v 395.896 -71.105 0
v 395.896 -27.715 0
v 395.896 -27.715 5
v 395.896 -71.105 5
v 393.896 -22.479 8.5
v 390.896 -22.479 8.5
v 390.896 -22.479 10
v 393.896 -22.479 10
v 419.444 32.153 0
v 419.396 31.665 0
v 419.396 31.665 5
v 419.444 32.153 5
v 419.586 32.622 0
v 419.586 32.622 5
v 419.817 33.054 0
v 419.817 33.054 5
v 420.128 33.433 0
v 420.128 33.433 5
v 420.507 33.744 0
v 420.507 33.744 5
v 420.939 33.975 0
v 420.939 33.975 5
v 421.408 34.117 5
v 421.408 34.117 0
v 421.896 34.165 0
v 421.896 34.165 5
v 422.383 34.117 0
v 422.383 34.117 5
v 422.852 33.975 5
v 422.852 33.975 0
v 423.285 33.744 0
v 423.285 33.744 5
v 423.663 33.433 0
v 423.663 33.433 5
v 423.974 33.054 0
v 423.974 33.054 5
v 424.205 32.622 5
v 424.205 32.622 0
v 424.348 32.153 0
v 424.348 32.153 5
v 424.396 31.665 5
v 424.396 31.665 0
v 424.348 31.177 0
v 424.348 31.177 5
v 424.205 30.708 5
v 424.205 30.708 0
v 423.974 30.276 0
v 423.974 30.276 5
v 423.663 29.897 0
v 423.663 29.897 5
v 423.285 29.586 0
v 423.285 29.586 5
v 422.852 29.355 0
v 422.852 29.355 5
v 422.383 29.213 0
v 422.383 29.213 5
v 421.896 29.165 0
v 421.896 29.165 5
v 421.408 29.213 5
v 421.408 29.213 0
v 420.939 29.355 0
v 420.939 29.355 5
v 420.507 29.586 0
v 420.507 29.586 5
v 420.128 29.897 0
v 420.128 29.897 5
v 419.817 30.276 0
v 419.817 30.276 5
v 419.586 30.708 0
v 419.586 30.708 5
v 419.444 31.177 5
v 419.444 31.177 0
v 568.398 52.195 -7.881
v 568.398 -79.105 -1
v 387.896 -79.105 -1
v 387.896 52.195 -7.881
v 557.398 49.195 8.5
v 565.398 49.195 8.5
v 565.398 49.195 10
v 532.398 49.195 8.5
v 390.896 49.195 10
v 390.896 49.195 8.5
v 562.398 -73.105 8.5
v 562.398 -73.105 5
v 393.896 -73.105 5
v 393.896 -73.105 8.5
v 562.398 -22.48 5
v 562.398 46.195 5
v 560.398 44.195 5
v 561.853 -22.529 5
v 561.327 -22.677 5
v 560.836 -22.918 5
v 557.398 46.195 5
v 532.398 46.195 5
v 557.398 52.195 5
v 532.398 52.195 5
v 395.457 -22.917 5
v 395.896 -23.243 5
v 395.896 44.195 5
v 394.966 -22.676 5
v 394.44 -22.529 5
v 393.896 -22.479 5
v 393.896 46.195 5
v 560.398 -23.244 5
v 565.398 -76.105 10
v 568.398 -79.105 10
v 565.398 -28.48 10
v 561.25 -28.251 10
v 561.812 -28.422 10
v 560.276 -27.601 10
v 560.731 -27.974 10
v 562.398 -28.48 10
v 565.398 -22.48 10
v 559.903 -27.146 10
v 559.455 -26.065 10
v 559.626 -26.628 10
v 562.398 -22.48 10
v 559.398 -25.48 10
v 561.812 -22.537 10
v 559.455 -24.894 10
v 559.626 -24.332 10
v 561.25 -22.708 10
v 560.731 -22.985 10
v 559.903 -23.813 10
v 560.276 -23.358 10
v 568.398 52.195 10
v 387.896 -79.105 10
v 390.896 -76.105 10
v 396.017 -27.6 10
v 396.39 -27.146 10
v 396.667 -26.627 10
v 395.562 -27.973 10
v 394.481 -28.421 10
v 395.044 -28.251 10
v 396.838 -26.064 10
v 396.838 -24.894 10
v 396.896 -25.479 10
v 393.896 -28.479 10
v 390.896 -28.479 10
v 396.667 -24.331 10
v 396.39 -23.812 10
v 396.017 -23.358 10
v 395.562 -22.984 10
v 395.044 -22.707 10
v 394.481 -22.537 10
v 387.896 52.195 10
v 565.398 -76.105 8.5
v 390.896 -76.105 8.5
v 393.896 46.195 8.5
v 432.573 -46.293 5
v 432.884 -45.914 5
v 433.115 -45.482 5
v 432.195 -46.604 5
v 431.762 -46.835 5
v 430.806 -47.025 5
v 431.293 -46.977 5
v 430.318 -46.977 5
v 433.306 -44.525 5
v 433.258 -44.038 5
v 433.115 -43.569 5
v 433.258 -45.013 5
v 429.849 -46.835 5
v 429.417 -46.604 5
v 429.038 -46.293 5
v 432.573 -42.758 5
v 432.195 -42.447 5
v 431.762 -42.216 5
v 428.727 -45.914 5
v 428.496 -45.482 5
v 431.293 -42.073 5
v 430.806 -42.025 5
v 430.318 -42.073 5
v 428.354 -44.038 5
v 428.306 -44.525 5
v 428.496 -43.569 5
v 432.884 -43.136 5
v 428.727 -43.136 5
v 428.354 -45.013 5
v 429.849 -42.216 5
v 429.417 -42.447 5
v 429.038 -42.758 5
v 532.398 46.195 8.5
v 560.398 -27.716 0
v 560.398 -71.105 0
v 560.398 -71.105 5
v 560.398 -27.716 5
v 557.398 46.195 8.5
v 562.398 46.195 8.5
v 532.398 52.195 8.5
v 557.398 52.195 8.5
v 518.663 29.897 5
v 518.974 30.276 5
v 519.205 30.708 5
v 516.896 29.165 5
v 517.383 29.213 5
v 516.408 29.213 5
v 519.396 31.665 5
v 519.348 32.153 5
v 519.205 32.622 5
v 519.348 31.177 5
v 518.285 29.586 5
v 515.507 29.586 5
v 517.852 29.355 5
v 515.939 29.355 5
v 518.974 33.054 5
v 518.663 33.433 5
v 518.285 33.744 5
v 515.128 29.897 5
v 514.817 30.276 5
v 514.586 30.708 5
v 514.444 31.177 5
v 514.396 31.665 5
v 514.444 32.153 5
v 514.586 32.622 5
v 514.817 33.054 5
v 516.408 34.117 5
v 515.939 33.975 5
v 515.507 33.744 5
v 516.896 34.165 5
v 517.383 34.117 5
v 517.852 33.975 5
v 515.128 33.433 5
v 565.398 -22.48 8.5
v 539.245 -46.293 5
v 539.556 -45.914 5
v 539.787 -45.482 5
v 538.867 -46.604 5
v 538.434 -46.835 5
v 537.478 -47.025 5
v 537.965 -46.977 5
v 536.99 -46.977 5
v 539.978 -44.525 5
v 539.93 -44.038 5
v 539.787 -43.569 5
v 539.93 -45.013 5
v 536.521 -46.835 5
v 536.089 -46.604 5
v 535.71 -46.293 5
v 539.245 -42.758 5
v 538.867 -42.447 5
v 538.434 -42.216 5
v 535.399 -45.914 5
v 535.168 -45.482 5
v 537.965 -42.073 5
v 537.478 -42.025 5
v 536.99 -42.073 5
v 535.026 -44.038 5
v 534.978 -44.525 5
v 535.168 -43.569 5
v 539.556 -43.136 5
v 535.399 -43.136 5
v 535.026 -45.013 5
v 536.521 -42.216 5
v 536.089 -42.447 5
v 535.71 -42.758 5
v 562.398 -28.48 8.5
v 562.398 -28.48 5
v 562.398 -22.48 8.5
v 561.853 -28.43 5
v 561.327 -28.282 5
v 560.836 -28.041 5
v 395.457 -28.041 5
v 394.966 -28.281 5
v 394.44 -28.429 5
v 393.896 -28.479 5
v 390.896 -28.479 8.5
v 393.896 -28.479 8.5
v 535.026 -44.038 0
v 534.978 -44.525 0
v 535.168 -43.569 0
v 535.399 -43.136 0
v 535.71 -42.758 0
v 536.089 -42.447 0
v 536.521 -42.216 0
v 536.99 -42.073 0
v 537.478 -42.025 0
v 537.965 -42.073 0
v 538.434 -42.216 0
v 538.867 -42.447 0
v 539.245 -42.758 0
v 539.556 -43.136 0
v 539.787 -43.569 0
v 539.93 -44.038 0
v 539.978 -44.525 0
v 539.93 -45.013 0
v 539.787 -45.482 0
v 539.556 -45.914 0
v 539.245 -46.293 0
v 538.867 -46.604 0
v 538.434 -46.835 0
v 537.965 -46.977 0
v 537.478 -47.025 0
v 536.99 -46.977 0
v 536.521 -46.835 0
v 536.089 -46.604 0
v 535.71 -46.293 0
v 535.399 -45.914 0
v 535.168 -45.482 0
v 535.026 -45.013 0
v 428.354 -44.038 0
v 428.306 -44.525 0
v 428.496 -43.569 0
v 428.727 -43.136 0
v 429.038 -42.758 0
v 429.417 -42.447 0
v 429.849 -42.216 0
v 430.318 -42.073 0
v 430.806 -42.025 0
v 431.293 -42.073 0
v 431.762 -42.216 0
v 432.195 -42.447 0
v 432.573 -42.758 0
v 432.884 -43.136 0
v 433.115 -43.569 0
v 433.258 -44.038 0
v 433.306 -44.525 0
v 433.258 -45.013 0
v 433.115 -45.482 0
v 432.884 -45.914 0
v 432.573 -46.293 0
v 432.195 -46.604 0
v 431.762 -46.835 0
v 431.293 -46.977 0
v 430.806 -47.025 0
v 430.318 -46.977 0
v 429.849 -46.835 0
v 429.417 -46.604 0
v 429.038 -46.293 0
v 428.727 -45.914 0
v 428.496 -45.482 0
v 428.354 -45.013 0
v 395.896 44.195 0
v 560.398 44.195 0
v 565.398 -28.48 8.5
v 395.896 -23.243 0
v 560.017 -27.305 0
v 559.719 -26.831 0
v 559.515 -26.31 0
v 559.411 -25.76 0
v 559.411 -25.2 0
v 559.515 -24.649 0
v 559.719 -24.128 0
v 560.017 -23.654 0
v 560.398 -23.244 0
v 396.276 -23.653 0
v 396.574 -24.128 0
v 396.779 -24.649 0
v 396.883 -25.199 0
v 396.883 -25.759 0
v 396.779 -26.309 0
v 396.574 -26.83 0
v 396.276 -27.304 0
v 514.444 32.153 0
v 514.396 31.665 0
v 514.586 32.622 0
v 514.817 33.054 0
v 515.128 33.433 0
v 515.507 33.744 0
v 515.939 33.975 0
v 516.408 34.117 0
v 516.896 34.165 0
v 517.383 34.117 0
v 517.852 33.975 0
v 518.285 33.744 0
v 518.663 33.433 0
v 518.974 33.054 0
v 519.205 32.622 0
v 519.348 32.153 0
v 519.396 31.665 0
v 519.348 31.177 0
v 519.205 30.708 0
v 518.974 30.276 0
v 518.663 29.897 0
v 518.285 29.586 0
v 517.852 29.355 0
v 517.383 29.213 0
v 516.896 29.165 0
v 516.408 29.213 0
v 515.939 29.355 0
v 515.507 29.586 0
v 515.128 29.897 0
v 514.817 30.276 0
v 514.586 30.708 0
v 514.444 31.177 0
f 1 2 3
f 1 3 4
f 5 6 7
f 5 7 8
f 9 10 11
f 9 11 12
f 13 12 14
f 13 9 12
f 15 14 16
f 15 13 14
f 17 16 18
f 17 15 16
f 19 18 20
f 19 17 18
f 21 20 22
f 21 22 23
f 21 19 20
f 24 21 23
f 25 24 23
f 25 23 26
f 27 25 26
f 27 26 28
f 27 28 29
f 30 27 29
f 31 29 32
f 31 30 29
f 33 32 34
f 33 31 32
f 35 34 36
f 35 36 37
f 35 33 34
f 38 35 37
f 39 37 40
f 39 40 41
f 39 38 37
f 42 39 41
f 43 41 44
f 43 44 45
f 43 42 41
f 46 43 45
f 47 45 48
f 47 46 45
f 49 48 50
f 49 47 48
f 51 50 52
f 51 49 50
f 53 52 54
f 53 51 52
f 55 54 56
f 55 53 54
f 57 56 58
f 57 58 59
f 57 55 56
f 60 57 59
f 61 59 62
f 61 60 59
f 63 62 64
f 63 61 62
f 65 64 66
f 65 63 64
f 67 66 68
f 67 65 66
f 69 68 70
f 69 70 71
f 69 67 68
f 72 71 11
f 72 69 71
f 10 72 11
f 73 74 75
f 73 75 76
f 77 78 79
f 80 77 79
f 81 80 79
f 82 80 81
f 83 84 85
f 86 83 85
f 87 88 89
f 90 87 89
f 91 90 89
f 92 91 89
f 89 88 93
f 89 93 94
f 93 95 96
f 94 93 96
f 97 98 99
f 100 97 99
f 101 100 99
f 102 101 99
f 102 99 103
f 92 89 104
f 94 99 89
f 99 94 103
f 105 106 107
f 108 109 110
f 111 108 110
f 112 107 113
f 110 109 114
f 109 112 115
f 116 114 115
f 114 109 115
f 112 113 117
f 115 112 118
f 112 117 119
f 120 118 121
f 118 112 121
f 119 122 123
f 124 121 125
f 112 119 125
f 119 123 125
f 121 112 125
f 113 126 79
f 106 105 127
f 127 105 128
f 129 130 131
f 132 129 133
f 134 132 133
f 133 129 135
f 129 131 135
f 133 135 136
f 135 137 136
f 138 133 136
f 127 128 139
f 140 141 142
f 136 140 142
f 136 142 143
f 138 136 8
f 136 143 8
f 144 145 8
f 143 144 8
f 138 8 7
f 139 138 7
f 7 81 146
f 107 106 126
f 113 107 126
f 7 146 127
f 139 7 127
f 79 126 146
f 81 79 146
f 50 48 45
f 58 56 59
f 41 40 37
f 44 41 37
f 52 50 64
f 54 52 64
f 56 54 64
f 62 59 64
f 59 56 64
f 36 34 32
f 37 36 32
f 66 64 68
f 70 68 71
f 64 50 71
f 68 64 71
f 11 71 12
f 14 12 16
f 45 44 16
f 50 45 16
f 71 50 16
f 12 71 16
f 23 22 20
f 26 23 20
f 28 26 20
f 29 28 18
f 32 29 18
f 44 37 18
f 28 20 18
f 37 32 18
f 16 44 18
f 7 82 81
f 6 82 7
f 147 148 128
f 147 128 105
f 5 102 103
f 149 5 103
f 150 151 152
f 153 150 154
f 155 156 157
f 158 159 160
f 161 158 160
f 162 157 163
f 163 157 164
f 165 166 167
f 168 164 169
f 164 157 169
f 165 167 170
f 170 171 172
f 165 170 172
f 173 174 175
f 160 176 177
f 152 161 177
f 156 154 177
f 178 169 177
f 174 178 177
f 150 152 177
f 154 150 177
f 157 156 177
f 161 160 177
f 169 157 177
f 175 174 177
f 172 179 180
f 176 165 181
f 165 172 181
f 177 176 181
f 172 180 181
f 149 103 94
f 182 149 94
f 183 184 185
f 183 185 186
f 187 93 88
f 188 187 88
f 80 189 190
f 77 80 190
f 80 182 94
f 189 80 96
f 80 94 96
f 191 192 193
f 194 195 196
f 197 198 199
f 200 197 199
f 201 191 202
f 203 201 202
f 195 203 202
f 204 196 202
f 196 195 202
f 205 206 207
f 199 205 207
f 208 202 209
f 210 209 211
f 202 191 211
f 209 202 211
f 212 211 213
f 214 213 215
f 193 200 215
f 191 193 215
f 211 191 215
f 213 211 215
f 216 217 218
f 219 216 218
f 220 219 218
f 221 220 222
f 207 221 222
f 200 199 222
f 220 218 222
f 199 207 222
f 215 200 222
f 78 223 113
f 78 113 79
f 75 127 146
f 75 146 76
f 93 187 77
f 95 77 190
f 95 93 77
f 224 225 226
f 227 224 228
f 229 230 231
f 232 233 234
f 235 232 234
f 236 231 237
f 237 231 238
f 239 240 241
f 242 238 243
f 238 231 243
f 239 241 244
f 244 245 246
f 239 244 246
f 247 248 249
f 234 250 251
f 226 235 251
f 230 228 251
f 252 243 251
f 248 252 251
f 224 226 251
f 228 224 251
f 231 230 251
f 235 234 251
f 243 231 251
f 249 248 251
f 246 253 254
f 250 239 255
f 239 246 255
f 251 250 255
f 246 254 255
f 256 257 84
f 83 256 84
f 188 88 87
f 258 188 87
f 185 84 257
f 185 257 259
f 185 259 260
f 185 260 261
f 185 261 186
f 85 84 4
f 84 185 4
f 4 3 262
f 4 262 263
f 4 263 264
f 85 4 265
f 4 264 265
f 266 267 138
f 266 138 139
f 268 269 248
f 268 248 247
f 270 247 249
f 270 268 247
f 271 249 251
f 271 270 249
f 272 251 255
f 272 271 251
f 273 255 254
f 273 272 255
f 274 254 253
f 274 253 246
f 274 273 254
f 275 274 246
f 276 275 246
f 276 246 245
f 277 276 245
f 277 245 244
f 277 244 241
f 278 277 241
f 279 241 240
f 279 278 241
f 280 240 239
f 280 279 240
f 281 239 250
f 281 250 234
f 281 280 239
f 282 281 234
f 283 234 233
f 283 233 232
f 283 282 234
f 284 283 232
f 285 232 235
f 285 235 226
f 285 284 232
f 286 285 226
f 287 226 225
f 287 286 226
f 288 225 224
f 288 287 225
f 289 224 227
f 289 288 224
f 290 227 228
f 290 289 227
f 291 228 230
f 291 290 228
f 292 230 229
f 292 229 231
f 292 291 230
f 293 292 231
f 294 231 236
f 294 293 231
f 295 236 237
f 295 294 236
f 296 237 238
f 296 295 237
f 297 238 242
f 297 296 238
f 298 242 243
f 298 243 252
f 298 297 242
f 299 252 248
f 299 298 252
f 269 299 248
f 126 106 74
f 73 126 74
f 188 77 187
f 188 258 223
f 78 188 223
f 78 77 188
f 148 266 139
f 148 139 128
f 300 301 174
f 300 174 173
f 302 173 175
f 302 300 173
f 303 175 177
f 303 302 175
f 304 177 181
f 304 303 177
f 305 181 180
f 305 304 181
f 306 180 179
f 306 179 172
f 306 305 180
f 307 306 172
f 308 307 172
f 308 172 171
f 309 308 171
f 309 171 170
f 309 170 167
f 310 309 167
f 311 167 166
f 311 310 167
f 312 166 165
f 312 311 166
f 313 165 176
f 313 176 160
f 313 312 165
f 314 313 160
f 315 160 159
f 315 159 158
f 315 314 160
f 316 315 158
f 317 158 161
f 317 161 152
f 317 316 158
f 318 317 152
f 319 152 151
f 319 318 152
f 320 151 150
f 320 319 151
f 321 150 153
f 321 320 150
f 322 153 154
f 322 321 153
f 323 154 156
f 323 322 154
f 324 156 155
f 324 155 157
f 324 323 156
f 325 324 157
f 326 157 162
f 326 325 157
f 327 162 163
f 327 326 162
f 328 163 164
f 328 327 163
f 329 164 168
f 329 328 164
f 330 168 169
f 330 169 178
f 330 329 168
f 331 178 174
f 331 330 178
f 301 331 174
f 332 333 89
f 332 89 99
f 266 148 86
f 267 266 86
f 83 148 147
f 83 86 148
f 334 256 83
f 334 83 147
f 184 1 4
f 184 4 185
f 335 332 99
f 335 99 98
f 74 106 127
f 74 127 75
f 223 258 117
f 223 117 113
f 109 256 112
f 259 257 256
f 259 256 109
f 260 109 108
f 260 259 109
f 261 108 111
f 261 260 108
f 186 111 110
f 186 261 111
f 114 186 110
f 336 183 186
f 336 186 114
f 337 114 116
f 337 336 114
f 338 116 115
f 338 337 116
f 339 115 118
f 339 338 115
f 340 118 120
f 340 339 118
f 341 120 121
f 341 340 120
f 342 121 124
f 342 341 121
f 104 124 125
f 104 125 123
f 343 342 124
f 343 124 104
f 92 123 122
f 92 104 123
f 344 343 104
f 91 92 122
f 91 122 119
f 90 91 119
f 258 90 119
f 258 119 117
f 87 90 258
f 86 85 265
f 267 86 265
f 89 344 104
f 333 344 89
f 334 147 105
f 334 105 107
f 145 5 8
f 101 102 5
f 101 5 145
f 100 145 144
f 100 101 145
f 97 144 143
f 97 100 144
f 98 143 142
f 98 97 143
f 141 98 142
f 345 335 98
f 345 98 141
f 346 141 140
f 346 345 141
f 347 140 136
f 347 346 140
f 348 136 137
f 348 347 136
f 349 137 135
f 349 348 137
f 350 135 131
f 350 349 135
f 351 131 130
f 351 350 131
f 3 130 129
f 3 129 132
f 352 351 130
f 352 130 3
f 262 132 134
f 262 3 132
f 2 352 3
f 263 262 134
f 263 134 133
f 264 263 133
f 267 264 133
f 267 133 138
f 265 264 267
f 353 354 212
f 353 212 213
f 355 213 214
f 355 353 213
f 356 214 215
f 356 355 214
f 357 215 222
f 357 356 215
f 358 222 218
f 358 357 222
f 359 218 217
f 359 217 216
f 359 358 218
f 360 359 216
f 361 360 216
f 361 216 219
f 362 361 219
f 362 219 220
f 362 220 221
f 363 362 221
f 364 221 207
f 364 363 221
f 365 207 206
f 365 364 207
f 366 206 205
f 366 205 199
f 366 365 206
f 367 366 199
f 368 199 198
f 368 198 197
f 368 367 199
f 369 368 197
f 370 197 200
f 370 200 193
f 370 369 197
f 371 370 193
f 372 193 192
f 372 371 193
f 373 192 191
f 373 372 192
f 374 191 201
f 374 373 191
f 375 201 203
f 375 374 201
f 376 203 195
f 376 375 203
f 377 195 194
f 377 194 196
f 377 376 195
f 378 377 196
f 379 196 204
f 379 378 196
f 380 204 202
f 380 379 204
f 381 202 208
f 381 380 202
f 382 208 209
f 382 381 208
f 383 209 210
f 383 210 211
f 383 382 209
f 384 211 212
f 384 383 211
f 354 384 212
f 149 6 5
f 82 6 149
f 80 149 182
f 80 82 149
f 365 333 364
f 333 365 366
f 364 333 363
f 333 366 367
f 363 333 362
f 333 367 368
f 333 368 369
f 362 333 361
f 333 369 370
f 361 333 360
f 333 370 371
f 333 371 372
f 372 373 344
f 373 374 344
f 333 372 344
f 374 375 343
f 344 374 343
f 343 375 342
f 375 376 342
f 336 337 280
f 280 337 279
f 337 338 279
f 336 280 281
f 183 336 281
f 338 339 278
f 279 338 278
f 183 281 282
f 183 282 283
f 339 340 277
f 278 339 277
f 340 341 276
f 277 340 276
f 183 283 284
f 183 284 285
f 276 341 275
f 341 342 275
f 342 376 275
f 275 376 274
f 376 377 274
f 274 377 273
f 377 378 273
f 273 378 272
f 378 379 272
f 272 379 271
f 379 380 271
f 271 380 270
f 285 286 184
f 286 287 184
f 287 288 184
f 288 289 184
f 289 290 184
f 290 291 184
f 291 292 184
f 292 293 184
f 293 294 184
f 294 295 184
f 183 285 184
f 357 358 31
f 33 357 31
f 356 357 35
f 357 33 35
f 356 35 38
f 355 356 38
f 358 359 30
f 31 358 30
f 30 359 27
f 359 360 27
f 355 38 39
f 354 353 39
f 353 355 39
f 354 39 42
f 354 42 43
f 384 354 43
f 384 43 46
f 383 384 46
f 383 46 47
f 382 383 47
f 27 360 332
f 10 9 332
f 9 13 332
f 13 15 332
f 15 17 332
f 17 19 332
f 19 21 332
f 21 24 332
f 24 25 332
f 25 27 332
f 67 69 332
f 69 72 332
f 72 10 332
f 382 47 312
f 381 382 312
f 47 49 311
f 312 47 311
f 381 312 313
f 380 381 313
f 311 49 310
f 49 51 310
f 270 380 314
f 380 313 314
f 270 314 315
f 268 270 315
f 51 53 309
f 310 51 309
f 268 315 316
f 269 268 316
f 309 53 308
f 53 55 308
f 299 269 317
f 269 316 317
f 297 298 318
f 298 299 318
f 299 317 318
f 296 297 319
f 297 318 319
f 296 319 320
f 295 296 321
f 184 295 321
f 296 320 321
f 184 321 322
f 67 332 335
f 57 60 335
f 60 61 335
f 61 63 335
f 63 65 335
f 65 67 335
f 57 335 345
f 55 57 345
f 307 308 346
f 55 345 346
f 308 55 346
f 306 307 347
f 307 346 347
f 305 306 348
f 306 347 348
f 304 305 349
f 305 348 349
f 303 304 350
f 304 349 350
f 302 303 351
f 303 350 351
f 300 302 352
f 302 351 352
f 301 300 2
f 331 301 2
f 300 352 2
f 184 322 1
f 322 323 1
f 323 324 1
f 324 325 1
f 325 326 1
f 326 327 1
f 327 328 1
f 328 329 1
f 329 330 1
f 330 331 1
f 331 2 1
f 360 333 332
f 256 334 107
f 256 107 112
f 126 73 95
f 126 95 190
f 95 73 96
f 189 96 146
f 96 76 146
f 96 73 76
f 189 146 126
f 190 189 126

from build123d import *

# Parameters (mm, degrees)
EXTRUDE_3_DEPTH     = 8.5
EXTRUDE_3_2_DEPTH   = 8.5
SKETCH_4_W          = 180.5019154
SKETCH_4_H          = 131.300307
EXTRUDE_5_DEPTH     = 10
EXTRUDE_6_DEPTH     = 5
SKETCH_8_W          = 25
SKETCH_8_H          = 6
CUT_EXTRUDE_1_DEPTH = 3.5
SKETCH_9_R          = 2.5
EXTRUDE_7_DEPTH     = 5
EXTRUDE_7_2_DEPTH   = 5
EXTRUDE_7_3_DEPTH   = 5
EXTRUDE_7_4_DEPTH   = 5
EXTRUDE_8_DEPTH     = 180.5019154


with BuildPart() as part:
    # Model → 凸台-拉伸3 (new body)
    with BuildSketch(Plane.XY):
        Polygon((565.397621393, -28.479593633), (562.397621393, -28.479593633), (562.397621393, -73.105300633), (393.895705993, -73.105300633), (393.895705993, -28.478893633), (390.895705993, -28.478893633), (390.895705993, -76.105300633), (565.397621393, -76.105300633), align=None)
    extrude(amount=EXTRUDE_3_DEPTH)



with BuildPart() as body_2:
    # Model → Extrude 3 2 (new body)
    with BuildSketch(Plane.XY):
        Polygon((393.895705993, -22.478893633), (393.895705993, 46.195006367), (562.397621393, 46.195006367), (562.397621393, -22.479593633), (565.397621393, -22.479593633), (565.397621393, 49.195006367), (390.895705993, 49.195006367), (390.895705993, -22.478893633), align=None)
    extrude(amount=EXTRUDE_3_2_DEPTH)


with BuildPart() as part_1:
    add(part.part)

    add(body_2.part)  # 凸台-拉伸5 merges body 2
    # 草图4 → 凸台-拉伸5 (add)
    with BuildSketch(Plane(origin=(0, 0, 0), x_dir=(-1, 0, 0), z_dir=(0, 0, -1))):
        with Locations((-478.146663693, -13.455147133)):
            Rectangle(SKETCH_4_W, SKETCH_4_H)
        with BuildLine():
            ThreePointArc((-562.397621393, -28.479593633), (-559.397621393, -25.479593633), (-562.397621393, -22.479593633))
            Line((-562.397621393, -22.479593633), (-565.397621393, -22.479593633))
            Line((-565.397621393, -22.479593633), (-565.397621393, 49.195006367))
            Line((-565.397621393, 49.195006367), (-390.895705993, 49.195006367))
            Line((-390.895705993, 49.195006367), (-390.895705993, -22.478893633))
            Line((-390.895705993, -22.478893633), (-393.895705993, -22.478893633))
            ThreePointArc((-393.895705993, -22.478893633), (-396.895705993, -25.478893633), (-393.895705993, -28.478893633))
            Line((-393.895705993, -28.478893633), (-390.895705993, -28.478893633))
            Line((-390.895705993, -28.478893633), (-390.895705993, -76.105300633))
            Line((-390.895705993, -76.105300633), (-565.397621393, -76.105300633))
            Line((-565.397621393, -76.105300633), (-565.397621393, -28.479593633))
            Line((-565.397621393, -28.479593633), (-562.397621393, -28.479593633))
        make_face(mode=Mode.SUBTRACT)
    extrude(amount=-EXTRUDE_5_DEPTH)

    # 草图5 → 凸台-拉伸6 (add)
    with BuildSketch(Plane(origin=(0, 0, 0), x_dir=(-1, 0, 0), z_dir=(0, 0, -1))):
        with BuildLine():
            Line((-562.397621393, 46.195006367), (-562.397621393, -22.479593633))
            ThreePointArc((-562.397621393, -22.479593633), (-561.327155124, -22.677076556), (-560.397621393, -23.243525656))
            Line((-560.397621393, -23.243525656), (-560.397621393, 44.195006367))
            Line((-560.397621393, 44.195006367), (-395.895705993, 44.195006367))
            Line((-395.895705993, 44.195006367), (-395.895705993, -23.242825656))
            ThreePointArc((-395.895705993, -23.242825656), (-394.966172262, -22.676376556), (-393.895705993, -22.478893633))
            Line((-393.895705993, -22.478893633), (-393.895705993, 46.195006367))
            Line((-393.895705993, 46.195006367), (-562.397621393, 46.195006367))
        make_face()
        with BuildLine():
            Line((-560.397621393, -71.105300633), (-560.397621393, -27.715661611))
            ThreePointArc((-560.397621393, -27.715661611), (-561.327155124, -28.28211071), (-562.397621393, -28.479593633))
            Line((-562.397621393, -28.479593633), (-562.397621393, -73.105300633))
            Line((-562.397621393, -73.105300633), (-393.895705993, -73.105300633))
            Line((-393.895705993, -73.105300633), (-393.895705993, -28.478893633))
            ThreePointArc((-393.895705993, -28.478893633), (-394.966172262, -28.28141071), (-395.895705993, -27.714961611))
            Line((-395.895705993, -27.714961611), (-395.895705993, -71.105300633))
            Line((-395.895705993, -71.105300633), (-560.397621393, -71.105300633))
        make_face()
    extrude(amount=-EXTRUDE_6_DEPTH)

    # 草图8 → 切除-拉伸1 (cut)
    with BuildSketch(Plane.XY.offset(5)):
        with Locations((544.897621393, 49.195006367)):
            Rectangle(SKETCH_8_W, SKETCH_8_H)
    extrude(amount=CUT_EXTRUDE_1_DEPTH, mode=Mode.SUBTRACT)



with BuildPart() as body_2_2:
    # 草图9 → 凸台-拉伸7 (new body)
    with BuildSketch(Plane(origin=(0, 0, 0), x_dir=(-1, 0, 0), z_dir=(0, 0, -1))):
        with Locations((-430.805705993, -44.525300633)):
            Circle(SKETCH_9_R)
    extrude(amount=-EXTRUDE_7_DEPTH)


with BuildPart() as body_3:
    # 草图9 → Extrude 7 2 (new body)
    with BuildSketch(Plane(origin=(0, 0, 0), x_dir=(-1, 0, 0), z_dir=(0, 0, -1))):
        with Locations((-537.477621393, -44.525300633)):
            Circle(SKETCH_9_R)
    extrude(amount=-EXTRUDE_7_2_DEPTH)


with BuildPart() as body_4:
    # 草图9 → Extrude 7 3 (new body)
    with BuildSketch(Plane(origin=(0, 0, 0), x_dir=(-1, 0, 0), z_dir=(0, 0, -1))):
        with Locations((-421.895705993, 31.665006367)):
            Circle(SKETCH_9_R)
    extrude(amount=-EXTRUDE_7_3_DEPTH)


with BuildPart() as body_5:
    # 草图9 → Extrude 7 4 (new body)
    with BuildSketch(Plane(origin=(0, 0, 0), x_dir=(-1, 0, 0), z_dir=(0, 0, -1))):
        with Locations((-516.895705993, 31.665006367)):
            Circle(SKETCH_9_R)
    extrude(amount=-EXTRUDE_7_4_DEPTH)


with BuildPart() as part_2:
    add(part_1.part)

    add(body_2_2.part)  # 凸台-拉伸8 merges body 2 2

    add(body_3.part)  # 凸台-拉伸8 merges body 3

    add(body_4.part)  # 凸台-拉伸8 merges body 4

    add(body_5.part)  # 凸台-拉伸8 merges body 5
    # 草图10 → 凸台-拉伸8 (add)
    with BuildSketch(Plane.ZY.offset(-387.895705993)):
        Polygon((-1, -79.105300633), (-7.881157509, 52.195006367), (0, 52.195006367), (0, -79.105300633), align=None)
    extrude(amount=-EXTRUDE_8_DEPTH)


solid = part_2.part
